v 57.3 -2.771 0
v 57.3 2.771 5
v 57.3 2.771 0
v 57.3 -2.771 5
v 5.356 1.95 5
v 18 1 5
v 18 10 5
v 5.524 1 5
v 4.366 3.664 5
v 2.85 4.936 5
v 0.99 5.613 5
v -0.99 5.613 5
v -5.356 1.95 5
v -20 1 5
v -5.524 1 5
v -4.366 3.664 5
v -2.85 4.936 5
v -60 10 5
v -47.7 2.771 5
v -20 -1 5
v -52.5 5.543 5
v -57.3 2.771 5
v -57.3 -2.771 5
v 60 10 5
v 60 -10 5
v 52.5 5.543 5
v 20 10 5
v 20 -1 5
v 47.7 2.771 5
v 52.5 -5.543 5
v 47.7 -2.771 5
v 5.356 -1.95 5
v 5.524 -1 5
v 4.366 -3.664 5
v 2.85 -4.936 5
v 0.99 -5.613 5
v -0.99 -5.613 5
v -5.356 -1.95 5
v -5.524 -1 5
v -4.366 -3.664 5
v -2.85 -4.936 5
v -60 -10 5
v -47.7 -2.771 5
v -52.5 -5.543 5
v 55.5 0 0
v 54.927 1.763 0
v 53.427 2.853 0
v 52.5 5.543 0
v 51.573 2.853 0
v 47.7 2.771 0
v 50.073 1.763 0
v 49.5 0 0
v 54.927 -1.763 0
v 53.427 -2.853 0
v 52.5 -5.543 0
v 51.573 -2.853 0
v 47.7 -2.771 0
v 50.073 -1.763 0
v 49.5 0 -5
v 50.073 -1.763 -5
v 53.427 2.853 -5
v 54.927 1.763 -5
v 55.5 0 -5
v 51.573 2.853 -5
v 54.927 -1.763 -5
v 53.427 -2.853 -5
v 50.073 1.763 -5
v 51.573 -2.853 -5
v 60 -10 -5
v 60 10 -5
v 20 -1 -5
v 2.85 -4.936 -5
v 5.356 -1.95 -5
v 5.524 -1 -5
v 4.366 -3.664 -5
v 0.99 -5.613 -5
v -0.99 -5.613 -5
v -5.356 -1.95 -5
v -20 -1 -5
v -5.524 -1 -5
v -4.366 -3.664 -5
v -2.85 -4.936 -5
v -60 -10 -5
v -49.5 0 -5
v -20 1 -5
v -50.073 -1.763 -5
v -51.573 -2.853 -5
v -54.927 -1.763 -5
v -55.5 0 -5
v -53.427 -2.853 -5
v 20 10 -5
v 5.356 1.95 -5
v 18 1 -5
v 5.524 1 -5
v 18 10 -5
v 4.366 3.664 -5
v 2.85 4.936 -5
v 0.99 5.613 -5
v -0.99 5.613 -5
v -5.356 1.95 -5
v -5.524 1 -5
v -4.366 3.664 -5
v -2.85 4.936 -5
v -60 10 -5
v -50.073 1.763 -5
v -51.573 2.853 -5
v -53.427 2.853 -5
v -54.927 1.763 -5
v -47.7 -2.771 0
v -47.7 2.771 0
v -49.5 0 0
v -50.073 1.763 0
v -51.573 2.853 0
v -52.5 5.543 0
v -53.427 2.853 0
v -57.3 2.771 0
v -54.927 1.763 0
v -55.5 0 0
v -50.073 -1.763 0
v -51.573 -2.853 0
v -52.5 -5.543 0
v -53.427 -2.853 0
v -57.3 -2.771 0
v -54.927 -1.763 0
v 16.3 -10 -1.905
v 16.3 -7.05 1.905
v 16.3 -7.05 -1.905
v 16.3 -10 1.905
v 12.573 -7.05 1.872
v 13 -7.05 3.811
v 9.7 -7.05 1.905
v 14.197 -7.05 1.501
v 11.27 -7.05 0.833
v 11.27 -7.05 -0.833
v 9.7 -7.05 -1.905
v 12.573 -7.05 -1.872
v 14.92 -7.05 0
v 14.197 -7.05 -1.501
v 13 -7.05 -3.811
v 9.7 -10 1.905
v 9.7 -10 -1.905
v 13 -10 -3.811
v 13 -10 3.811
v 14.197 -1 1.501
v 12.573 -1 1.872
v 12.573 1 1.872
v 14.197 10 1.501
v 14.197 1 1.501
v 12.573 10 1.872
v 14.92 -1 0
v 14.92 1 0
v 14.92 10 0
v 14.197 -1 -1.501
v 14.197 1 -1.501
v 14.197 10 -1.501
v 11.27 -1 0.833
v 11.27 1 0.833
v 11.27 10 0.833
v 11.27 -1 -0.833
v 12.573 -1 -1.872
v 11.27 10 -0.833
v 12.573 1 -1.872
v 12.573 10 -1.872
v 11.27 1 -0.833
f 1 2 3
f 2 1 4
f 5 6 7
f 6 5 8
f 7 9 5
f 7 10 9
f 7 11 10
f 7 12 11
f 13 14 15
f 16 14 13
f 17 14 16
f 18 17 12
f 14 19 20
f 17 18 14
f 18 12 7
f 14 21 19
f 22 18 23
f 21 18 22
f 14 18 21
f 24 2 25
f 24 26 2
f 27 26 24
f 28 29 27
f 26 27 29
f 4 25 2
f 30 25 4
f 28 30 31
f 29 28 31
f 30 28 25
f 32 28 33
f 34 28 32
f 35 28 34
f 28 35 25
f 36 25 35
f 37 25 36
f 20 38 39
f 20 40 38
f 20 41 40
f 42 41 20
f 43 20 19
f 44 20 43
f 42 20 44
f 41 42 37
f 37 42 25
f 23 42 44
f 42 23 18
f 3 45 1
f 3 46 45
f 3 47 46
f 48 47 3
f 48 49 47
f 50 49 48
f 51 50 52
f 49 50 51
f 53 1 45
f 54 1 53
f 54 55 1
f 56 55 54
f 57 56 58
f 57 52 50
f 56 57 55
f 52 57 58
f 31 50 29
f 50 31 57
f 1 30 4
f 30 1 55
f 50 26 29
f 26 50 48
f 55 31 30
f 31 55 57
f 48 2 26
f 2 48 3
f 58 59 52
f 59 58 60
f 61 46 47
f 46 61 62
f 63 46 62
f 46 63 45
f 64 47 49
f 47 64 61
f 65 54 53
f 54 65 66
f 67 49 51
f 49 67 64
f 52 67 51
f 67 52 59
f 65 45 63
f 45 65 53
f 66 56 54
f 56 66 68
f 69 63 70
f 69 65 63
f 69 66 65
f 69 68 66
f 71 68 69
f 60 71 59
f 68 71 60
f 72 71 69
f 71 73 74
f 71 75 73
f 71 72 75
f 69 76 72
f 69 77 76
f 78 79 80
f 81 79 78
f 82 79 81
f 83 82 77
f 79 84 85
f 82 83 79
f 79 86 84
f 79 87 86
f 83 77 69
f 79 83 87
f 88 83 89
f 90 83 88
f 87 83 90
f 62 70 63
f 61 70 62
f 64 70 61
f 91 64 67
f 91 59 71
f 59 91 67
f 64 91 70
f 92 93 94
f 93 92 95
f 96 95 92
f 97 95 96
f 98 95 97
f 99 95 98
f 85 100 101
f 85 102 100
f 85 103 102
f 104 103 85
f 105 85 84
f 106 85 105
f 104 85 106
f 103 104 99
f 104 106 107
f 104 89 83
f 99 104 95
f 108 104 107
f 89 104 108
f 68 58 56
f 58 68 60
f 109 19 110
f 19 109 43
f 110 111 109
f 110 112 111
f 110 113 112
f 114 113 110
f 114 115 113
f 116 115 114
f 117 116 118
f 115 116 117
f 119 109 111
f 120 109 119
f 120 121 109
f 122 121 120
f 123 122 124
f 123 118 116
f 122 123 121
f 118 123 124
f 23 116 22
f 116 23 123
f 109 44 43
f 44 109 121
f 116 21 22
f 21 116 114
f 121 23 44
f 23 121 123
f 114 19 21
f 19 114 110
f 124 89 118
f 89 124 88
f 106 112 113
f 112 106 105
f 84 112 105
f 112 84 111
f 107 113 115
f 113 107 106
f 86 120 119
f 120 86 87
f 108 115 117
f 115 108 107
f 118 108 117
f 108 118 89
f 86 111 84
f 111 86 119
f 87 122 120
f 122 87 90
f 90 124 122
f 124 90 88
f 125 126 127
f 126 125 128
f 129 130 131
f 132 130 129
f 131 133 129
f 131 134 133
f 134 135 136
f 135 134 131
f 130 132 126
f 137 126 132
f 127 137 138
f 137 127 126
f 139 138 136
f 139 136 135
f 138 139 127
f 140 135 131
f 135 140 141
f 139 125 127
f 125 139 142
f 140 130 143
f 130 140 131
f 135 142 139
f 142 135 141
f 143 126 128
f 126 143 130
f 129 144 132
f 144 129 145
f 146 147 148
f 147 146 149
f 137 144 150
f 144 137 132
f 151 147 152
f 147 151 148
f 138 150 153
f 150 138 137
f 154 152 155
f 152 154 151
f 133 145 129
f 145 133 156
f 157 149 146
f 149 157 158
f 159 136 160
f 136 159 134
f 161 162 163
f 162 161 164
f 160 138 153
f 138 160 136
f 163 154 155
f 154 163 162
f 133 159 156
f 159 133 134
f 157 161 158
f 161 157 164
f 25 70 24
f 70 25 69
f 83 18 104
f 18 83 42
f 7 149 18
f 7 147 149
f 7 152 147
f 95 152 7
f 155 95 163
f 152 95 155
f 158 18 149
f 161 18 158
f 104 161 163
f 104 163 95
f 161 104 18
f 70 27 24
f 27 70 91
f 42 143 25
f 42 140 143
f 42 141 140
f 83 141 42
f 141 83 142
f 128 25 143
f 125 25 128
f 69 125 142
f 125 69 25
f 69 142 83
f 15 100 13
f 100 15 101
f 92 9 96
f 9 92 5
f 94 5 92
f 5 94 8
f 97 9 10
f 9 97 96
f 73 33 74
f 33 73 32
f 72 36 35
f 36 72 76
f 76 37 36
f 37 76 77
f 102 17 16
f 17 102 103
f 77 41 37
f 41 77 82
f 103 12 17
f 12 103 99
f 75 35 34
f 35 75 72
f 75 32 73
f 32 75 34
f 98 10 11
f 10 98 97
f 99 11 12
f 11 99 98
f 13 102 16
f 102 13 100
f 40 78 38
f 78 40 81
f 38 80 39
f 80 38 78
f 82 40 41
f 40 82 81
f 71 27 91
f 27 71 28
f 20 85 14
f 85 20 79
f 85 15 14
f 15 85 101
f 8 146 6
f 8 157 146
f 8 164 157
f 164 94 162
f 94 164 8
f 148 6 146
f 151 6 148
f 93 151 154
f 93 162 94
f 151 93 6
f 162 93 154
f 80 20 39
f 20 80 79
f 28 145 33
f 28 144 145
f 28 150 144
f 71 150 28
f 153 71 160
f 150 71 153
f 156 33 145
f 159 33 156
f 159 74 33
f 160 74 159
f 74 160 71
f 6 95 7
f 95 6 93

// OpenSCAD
hole_fudge = 1.2;

module hexagon(size, height) {
	union() {
		for(i=[0:2]) //loop i from 0 to 2
		{ 
			//make a cube, rotate it 60 degrees around the X axis,
			rotate([0,0,120*i]) {
				cube([size*hole_fudge,(size/tan(60))*hole_fudge,height], center = true);
			}
		}
	}
}

module boltHole() {
	translate(v=[0,0,2.5]) {
		hexagon(size=8, height = 5);
	}
	cylinder(h = 10, r = 2.5*hole_fudge, center = true);	
}
module depthIndicatorMount()
{
	difference() { 
		// Plate
		cube(size = [120,20,10], center = true);
		// Gauge hole
		cylinder(h = 10, r = 4.75*hole_fudge, center = true);
		
		// Screw mounts
		translate(v=[52.5,0,0]) {
			boltHole();
		}
		translate(v=[-52.5,0,0]) {
			boltHole();
		}
		// hinge cutout
		cube(size = [40,2,10],center = true);
		translate(v=[20-1,5,0]) {
			cube(size = [2,10,10],center = true);
		}
		// screw hole for hinge
		translate(v=[13,0,0]) {
			rotate(a=[90,0,0]) {
				cylinder(h = 21, r = 1.6*hole_fudge, center = true);
				translate(v=[0,0,10-1.45]) {
					hexagon(size=5.5, height = 3);
				}
			}
		}
	}
}

depthIndicatorMount();
